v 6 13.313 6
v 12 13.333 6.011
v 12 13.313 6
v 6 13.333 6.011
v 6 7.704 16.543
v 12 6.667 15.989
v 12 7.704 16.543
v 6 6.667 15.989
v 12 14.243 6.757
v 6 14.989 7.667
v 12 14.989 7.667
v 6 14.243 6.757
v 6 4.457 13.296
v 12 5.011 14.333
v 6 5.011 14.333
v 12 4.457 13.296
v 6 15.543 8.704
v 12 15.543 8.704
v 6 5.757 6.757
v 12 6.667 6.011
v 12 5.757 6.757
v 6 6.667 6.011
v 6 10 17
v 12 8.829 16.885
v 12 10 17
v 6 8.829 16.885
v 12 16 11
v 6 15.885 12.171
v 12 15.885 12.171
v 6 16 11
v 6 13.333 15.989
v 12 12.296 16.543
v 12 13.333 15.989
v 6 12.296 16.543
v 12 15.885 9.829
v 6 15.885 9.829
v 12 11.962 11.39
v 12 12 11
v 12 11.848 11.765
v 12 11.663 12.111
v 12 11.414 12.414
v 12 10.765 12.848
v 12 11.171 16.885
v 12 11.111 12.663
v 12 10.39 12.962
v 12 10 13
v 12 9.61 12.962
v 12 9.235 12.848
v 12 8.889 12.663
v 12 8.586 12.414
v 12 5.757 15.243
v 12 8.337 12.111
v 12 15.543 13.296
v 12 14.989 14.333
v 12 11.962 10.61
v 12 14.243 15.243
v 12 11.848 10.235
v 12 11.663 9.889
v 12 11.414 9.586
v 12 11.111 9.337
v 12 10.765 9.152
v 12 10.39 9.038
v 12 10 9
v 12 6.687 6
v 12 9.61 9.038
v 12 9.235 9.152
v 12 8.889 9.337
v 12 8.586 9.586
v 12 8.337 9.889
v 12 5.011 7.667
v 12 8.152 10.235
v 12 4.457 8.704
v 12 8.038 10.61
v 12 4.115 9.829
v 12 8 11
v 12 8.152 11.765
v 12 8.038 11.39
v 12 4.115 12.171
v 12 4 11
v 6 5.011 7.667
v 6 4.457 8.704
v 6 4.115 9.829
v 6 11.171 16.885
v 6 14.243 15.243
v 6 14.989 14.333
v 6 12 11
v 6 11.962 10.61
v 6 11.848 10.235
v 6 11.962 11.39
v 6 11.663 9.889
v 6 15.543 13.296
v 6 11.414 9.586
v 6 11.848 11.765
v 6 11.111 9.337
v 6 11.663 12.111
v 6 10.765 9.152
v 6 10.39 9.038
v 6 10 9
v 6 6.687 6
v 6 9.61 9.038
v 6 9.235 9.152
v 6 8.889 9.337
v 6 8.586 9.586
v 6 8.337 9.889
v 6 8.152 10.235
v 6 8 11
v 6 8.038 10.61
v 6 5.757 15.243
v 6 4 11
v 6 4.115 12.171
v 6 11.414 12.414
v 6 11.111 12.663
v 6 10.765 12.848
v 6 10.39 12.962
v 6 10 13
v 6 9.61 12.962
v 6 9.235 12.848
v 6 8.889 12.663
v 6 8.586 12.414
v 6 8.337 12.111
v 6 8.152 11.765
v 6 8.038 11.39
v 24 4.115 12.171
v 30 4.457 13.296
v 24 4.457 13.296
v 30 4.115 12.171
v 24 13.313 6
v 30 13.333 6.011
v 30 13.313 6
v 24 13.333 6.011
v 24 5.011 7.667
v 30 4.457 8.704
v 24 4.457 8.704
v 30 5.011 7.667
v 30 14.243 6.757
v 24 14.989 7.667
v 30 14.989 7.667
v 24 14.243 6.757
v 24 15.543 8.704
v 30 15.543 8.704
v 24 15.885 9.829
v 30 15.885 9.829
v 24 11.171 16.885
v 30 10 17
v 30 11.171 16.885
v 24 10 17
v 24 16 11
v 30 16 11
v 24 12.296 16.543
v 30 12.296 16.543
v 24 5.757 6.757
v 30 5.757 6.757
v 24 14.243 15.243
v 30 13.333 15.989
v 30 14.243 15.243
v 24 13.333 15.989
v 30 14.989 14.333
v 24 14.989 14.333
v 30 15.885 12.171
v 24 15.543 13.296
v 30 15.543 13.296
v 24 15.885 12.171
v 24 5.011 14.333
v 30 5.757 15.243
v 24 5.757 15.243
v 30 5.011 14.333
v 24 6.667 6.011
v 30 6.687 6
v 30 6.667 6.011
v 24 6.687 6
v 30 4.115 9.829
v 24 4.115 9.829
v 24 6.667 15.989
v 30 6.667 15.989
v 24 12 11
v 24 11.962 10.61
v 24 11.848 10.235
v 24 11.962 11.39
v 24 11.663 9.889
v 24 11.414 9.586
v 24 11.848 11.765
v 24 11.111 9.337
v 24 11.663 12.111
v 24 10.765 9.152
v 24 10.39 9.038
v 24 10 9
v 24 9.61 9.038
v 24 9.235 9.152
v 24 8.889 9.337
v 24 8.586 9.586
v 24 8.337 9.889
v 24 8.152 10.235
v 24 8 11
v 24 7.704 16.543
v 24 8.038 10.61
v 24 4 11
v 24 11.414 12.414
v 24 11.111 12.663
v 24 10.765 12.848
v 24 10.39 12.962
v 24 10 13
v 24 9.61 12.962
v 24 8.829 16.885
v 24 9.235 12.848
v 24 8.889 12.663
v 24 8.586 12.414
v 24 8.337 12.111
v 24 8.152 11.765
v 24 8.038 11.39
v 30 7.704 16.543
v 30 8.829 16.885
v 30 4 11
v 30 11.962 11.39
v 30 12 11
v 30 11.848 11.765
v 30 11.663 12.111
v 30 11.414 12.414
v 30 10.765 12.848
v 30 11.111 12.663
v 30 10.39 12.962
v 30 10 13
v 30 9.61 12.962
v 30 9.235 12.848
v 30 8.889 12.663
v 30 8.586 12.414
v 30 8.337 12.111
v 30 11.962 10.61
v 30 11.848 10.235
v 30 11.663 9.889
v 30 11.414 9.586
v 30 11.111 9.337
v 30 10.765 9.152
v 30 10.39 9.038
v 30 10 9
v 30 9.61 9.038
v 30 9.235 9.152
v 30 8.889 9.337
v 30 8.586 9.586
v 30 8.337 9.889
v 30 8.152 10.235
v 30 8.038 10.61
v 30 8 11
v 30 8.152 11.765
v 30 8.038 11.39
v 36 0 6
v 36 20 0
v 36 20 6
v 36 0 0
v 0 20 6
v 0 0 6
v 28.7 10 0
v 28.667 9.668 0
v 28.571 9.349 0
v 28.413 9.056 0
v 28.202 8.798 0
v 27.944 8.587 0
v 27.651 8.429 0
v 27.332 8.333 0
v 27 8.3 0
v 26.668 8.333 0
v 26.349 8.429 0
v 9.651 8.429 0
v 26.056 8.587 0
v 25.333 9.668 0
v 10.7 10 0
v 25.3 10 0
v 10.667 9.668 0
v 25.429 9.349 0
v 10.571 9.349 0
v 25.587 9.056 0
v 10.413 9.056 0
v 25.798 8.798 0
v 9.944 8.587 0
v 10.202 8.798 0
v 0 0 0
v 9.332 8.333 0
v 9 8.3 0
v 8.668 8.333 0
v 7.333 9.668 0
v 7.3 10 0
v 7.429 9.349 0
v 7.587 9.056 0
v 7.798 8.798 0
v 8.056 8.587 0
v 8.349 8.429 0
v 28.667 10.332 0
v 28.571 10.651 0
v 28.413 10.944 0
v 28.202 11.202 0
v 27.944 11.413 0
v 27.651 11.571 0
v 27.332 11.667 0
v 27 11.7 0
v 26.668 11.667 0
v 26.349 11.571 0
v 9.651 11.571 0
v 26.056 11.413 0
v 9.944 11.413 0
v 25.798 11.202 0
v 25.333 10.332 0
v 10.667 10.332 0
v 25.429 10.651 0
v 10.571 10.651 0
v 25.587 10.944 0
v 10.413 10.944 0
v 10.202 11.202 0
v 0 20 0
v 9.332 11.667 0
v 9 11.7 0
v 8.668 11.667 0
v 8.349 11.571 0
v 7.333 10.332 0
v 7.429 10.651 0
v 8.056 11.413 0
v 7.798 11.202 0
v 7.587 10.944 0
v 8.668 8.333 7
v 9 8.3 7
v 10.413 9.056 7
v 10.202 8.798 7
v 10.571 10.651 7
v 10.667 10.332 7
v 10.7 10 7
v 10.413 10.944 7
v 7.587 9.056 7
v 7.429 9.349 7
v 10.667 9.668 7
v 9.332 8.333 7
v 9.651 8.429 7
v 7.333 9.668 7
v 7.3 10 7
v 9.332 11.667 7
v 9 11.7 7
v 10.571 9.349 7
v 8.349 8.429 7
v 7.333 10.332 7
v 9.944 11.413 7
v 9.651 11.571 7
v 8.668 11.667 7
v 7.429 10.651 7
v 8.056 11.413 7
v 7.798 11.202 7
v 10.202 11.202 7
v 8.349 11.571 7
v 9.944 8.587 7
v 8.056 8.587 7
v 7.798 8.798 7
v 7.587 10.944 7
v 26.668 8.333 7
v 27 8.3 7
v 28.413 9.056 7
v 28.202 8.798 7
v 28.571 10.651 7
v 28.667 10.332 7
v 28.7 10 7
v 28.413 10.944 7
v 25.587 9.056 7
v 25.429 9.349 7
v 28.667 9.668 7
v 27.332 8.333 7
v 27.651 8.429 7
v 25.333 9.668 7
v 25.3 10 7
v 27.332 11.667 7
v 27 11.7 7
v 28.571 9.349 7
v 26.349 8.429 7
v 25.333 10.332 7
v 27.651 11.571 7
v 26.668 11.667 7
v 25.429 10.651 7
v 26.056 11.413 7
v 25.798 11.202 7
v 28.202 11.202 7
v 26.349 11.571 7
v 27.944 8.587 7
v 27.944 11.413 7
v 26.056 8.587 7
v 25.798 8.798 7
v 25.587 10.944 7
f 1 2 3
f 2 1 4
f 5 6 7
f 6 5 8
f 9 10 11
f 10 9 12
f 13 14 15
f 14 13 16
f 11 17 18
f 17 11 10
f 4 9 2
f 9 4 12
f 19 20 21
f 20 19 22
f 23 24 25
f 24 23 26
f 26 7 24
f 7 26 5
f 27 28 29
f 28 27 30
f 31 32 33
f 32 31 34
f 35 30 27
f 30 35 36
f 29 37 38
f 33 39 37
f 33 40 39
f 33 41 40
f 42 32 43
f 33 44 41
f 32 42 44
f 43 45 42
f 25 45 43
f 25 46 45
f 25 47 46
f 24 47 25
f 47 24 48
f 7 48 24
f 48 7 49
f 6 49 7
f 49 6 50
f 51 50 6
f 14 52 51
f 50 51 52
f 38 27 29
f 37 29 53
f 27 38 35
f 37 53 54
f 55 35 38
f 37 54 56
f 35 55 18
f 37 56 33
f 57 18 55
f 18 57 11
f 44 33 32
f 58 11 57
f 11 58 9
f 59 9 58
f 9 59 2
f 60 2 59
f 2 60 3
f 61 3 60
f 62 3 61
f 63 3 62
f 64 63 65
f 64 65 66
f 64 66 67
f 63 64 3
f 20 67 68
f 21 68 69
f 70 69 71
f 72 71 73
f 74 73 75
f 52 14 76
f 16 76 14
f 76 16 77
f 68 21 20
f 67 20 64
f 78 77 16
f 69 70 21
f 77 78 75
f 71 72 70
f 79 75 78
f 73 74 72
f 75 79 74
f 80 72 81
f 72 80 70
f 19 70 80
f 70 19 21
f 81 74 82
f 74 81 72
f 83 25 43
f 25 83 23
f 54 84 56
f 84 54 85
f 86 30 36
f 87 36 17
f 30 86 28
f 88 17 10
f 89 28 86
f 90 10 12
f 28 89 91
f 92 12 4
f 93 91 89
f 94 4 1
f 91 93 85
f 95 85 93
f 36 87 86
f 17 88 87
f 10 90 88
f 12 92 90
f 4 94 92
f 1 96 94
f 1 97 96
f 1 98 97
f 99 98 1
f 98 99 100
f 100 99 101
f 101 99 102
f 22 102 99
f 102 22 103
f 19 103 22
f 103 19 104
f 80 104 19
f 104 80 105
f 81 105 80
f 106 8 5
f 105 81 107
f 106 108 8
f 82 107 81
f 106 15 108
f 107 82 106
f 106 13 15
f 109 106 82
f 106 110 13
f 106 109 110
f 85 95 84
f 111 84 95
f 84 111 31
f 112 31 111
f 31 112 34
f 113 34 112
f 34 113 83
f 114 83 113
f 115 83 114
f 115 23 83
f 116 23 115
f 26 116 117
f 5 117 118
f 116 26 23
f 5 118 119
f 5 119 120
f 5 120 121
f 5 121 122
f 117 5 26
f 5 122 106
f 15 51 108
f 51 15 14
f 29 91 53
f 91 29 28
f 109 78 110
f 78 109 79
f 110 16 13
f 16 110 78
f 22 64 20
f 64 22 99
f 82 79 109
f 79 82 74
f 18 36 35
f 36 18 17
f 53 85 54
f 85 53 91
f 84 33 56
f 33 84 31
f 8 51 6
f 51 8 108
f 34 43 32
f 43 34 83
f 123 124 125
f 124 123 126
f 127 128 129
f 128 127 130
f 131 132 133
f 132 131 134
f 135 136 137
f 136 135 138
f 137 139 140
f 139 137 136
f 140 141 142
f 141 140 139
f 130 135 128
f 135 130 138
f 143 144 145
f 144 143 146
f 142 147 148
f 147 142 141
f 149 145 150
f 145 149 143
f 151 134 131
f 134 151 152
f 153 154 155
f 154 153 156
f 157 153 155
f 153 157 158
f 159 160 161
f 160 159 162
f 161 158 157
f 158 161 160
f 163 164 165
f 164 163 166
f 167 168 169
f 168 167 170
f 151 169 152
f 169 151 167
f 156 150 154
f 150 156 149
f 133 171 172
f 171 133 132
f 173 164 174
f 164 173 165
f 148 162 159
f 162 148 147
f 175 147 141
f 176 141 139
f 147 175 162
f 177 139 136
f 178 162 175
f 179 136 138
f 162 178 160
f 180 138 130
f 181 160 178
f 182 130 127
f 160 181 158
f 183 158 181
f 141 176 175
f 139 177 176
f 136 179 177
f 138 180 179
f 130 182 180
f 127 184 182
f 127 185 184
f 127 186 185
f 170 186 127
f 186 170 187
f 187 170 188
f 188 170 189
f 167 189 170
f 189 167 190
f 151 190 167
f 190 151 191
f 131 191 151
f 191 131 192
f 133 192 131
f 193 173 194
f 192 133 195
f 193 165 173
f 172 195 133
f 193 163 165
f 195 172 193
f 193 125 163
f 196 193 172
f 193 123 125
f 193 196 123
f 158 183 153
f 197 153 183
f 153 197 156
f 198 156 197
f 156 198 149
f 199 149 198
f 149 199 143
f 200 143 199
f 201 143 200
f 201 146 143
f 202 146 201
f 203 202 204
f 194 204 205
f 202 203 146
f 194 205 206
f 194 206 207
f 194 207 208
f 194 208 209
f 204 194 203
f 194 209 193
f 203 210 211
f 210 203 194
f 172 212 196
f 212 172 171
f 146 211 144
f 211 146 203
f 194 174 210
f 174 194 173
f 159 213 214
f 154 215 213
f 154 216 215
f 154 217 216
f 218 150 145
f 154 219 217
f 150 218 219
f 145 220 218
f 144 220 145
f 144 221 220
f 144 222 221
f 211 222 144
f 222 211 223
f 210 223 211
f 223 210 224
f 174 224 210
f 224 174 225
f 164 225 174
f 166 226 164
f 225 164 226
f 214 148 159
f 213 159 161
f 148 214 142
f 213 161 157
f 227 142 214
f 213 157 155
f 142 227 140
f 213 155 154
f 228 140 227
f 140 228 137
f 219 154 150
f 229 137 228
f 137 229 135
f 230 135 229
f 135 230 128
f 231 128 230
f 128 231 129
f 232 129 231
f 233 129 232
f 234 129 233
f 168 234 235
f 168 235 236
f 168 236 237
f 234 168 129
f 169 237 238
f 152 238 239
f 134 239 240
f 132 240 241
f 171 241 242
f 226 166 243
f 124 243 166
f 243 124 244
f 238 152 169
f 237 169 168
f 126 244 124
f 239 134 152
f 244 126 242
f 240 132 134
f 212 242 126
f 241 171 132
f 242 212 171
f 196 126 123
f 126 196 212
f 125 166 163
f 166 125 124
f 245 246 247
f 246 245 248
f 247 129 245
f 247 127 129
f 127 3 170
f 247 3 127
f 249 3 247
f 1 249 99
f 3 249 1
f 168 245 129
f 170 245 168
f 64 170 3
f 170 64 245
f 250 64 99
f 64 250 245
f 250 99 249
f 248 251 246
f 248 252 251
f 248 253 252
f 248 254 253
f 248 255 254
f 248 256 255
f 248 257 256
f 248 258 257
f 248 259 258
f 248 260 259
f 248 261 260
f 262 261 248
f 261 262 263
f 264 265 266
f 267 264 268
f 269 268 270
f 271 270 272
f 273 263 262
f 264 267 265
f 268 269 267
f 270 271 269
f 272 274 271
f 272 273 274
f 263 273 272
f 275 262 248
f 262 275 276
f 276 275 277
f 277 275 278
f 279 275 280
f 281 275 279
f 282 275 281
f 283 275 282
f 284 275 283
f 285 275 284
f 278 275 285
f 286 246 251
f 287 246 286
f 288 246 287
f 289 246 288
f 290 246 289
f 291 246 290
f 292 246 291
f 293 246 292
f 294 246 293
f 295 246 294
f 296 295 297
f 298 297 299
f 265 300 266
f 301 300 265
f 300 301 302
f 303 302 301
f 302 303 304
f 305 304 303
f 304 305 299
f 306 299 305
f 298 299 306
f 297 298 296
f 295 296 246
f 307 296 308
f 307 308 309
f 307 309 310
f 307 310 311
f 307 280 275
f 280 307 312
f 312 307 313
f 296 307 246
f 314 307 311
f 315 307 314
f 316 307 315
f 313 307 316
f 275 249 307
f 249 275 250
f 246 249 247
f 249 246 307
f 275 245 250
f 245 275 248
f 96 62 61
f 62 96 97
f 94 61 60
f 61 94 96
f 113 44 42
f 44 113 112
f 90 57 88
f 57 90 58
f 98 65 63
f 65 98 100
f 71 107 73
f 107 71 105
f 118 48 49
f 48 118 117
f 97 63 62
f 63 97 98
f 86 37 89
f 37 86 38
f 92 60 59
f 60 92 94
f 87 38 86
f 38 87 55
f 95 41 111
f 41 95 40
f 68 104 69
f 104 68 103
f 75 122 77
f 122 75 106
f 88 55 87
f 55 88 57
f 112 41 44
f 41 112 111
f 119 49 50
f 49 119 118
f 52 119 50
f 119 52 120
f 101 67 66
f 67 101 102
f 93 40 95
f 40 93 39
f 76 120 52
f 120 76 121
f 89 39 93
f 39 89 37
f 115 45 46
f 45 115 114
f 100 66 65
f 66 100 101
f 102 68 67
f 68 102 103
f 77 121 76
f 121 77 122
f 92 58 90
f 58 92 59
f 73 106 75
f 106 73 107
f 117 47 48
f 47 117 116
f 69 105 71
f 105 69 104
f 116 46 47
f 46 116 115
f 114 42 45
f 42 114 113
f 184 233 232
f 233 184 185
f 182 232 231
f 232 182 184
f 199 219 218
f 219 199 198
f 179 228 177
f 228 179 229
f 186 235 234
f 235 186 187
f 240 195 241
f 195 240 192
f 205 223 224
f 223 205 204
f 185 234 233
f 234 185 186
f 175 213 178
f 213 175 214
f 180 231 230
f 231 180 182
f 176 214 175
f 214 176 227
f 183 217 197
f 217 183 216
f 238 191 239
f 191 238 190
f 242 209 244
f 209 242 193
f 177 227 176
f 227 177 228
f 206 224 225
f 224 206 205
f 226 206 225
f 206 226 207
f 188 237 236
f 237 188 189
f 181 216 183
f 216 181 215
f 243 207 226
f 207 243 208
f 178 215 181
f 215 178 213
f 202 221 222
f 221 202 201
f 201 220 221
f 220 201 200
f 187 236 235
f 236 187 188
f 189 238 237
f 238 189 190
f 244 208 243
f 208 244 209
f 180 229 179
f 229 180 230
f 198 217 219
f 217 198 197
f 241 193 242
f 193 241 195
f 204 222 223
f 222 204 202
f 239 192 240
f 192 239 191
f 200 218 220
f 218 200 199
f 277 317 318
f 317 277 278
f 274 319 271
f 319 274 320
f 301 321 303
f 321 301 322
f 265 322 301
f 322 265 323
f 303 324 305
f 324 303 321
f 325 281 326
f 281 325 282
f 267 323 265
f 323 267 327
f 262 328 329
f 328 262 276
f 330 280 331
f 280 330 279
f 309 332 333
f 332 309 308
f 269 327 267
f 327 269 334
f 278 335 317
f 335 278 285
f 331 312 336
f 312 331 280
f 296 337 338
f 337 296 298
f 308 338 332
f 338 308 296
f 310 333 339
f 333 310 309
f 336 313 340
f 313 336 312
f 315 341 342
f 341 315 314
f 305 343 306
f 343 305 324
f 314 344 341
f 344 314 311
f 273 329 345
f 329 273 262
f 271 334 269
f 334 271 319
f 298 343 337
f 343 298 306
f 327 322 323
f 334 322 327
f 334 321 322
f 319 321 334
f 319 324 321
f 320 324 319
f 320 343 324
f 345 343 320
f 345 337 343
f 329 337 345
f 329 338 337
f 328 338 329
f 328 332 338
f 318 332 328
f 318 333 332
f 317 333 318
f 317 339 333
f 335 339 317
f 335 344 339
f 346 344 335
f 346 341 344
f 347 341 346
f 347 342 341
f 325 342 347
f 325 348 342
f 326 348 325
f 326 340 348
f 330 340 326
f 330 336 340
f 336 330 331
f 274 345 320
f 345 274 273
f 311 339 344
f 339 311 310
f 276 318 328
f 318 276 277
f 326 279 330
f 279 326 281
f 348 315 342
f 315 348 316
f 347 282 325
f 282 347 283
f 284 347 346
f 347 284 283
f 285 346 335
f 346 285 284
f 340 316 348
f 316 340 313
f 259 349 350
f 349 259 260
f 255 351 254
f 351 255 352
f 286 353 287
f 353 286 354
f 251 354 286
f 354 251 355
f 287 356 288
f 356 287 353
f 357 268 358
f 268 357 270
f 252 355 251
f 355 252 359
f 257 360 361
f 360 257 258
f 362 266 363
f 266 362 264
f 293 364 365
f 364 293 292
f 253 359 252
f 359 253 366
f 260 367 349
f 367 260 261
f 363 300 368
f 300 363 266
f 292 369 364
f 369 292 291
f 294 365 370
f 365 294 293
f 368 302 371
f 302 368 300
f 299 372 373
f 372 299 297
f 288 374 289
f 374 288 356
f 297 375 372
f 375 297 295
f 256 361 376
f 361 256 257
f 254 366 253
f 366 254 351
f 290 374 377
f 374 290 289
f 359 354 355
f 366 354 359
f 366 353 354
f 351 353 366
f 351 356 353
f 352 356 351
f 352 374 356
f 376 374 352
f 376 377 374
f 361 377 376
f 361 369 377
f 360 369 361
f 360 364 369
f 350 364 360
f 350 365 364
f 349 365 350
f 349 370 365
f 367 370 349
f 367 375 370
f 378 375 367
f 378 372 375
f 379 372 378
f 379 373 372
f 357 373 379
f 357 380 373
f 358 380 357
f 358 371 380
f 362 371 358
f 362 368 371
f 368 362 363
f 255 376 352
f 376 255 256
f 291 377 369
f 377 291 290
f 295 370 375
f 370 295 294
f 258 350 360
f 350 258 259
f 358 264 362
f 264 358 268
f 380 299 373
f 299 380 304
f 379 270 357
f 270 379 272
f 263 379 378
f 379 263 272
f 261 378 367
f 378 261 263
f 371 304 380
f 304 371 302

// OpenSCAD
$fn = 32;

// ----------------------------------------------------------------------
// Cable clip: cable 4 mm, clamp 12 mm, base 36 mm
// ----------------------------------------------------------------------

// --- parameters (mm) ---
base_w = 36;              // base length, X
base_d = 20;              // base width, Y
base_t = 6;               // base thickness
clamp_d = 12;             // clamp outside diameter
wall_t = 4;               // clamp wall
cable_d = 4;              // cable opening
ring_w = 6;               // clamp width along the cable
screw_d = 3.4;            // screw clearance
sink = 1;                 // overlap of the clamp into the base
pitch = 18;               // distance between the two clamps

module base() {
  cube([base_w, base_d, base_t]);
}

module clamps() {
  for (sx = [-1, 1])
    translate([base_w / 2 + sx * pitch / 2, base_d / 2, base_t + clamp_d / 2 - sink]) rotate([0, 90, 0])
      cylinder(h = ring_w, d = clamp_d, center = true);
}

difference() {
  union() {
    base();
    clamps();
  }
  for (sx = [-1, 1])
    translate([base_w / 2 + sx * pitch / 2, base_d / 2, base_t + clamp_d / 2 - sink]) rotate([0, 90, 0]) translate([0, 0, -ring_w / 2 - 1]) cylinder(h = ring_w + 2, d = cable_d);
  translate([9, base_d / 2, -1]) cylinder(h = base_t + 2, d = screw_d);
  translate([27, base_d / 2, -1]) cylinder(h = base_t + 2, d = screw_d);
}
